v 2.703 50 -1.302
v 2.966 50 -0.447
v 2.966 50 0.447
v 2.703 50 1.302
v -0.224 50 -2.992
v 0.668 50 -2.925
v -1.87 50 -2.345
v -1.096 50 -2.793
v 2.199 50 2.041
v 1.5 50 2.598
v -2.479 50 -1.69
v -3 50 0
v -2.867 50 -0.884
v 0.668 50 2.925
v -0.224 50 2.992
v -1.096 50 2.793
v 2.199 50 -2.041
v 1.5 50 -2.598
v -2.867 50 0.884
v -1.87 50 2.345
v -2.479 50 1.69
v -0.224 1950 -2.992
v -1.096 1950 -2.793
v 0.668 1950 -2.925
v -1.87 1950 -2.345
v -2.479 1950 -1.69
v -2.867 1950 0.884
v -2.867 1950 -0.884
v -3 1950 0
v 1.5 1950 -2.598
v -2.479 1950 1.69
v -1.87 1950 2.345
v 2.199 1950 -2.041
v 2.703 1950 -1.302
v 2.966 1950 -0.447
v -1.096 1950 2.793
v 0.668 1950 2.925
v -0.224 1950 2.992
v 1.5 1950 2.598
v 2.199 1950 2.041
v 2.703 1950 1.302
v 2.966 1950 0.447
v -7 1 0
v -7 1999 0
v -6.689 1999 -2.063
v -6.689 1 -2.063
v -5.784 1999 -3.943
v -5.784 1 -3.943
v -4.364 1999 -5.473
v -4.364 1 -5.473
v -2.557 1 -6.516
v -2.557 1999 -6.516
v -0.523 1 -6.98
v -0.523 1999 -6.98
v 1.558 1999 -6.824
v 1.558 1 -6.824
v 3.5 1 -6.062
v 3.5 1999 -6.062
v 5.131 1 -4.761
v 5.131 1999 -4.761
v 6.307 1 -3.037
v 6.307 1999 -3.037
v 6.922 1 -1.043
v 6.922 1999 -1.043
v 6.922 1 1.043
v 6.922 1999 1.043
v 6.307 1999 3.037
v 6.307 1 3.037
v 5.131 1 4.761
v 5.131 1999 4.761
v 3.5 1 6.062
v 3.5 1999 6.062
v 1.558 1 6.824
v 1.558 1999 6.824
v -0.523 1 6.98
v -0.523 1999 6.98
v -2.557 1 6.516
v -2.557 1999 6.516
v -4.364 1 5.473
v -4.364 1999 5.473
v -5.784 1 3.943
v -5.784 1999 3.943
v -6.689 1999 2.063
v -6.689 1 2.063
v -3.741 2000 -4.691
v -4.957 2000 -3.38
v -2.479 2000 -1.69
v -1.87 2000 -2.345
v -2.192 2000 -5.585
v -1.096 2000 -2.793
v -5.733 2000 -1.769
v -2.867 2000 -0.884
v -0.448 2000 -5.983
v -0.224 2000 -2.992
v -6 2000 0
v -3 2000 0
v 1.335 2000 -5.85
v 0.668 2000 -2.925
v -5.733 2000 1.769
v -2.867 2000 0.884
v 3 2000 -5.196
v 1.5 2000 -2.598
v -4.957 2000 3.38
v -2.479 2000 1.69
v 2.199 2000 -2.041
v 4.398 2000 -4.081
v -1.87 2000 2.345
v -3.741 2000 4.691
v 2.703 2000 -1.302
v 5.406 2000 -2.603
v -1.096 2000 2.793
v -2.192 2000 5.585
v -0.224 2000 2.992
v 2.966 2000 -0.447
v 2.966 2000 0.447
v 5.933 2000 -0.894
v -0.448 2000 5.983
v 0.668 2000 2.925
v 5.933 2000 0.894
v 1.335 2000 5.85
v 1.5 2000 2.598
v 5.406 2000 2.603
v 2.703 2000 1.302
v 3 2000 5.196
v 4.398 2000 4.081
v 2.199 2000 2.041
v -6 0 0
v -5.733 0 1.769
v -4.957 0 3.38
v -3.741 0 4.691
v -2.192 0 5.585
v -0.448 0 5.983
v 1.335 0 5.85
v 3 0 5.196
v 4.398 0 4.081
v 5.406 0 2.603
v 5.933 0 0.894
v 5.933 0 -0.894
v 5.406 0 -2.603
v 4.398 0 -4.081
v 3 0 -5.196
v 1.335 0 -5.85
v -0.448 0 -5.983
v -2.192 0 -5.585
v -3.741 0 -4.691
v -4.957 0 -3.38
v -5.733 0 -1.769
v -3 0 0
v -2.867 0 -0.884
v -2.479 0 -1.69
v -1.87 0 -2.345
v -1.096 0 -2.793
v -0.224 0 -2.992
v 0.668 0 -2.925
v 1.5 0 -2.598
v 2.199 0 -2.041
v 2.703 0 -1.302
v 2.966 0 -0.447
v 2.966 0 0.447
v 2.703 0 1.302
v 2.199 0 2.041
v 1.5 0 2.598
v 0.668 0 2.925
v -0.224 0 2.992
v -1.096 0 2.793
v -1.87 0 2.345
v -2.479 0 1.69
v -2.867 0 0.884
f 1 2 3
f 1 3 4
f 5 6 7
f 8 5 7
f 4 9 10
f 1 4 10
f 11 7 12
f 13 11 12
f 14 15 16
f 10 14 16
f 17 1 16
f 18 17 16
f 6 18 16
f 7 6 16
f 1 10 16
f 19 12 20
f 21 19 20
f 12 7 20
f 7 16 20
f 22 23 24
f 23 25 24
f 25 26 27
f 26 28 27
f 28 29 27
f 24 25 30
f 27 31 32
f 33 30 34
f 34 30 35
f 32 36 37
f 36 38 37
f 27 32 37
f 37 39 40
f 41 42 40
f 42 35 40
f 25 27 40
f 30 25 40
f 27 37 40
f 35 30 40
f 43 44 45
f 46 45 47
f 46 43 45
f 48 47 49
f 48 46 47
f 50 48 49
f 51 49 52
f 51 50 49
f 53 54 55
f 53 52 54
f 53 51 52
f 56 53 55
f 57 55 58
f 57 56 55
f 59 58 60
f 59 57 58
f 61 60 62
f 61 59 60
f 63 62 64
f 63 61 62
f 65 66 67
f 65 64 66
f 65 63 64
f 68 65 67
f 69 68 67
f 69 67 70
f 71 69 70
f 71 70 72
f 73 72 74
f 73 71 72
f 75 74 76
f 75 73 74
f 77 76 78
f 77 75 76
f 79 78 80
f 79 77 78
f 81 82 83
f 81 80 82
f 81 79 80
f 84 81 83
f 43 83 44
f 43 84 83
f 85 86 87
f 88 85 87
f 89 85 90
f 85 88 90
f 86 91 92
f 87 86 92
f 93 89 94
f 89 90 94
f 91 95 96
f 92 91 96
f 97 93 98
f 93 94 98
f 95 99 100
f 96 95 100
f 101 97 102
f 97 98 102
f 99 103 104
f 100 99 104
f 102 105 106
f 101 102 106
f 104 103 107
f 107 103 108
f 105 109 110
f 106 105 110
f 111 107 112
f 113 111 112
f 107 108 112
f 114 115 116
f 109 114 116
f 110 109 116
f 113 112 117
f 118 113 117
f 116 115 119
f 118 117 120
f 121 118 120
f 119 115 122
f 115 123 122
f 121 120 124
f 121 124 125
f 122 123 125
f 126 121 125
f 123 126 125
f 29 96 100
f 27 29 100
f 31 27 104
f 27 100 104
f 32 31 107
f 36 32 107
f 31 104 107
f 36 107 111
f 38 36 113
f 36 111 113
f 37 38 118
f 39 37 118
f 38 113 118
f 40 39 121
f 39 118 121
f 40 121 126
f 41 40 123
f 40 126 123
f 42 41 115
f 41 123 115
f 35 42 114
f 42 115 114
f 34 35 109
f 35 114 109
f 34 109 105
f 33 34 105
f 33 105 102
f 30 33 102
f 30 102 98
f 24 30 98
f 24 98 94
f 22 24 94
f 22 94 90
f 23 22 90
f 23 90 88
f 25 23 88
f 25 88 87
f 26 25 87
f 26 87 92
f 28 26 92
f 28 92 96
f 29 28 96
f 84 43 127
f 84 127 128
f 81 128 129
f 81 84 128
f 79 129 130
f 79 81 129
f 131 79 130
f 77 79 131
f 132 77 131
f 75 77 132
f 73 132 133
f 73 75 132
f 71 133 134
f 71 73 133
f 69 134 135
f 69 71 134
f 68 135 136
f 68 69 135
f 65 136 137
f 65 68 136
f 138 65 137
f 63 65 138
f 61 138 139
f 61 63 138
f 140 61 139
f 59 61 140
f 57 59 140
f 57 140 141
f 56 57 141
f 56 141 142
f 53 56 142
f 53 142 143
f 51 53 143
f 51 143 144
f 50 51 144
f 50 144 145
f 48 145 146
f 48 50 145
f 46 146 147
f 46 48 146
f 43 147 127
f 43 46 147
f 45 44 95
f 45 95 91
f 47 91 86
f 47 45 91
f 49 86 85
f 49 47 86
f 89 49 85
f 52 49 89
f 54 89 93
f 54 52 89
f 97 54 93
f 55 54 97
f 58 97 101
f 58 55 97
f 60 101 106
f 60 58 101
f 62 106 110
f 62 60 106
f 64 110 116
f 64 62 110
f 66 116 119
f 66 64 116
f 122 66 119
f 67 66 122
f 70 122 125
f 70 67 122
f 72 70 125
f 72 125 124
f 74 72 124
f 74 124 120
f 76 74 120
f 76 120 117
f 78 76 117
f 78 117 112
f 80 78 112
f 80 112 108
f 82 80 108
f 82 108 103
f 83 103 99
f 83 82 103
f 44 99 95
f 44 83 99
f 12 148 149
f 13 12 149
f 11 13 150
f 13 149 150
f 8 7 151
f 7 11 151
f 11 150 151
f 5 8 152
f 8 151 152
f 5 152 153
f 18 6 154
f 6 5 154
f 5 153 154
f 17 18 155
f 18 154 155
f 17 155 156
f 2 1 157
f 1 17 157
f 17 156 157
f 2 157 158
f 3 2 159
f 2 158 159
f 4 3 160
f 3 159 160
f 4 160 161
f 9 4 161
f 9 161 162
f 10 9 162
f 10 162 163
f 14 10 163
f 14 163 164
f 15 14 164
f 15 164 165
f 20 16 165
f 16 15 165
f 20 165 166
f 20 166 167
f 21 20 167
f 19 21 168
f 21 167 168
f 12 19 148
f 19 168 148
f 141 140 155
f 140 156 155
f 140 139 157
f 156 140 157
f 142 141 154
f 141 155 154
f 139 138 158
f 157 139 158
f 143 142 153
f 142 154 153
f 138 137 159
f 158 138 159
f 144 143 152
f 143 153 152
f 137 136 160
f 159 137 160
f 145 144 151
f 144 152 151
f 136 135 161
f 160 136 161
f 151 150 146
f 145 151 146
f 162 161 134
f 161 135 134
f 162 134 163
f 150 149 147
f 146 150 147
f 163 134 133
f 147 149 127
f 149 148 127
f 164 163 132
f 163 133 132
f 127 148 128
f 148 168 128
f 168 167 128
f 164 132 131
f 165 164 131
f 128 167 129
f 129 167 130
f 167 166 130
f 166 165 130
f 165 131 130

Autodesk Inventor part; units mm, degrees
ref_plane "YZ Plane" through (0, 0, 0) normal (1, 0, 0) x (0, 1, 0)
ref_plane "XZ Plane" through (0, 0, 0) normal (0, 1, 0) x (-1, 0, 0)
ref_plane "XY Plane" through (0, 0, 0) normal (0, 0, 1) x (1, 0, 0)
sketch "Sketch1" plane through (0, 0, 0) normal (0, 1, 0) x (-1, 0, 0)
  circle A0 centre (0, 0) radius 7
  circle A1 centre (0, 0) radius 3
  dimension "d0" = 14
  dimension "d1" = 6
extrude "Extrusion1" add sketch "Sketch1" along normal blind 1000 contours A0 | A1
extrude "Extrusion2" cut sketch "Sketch1" along normal blind 50 contours A1
chamfer "Chamfer1" distance 1 angle 45 1 edges at (7, 0, 0)
mirror "Mirror1" about plane through (0, 1000, 0) normal (0, 1, 0) of "Extrusion1", "Extrusion2", "Chamfer1"
properties part number "Tengely"
